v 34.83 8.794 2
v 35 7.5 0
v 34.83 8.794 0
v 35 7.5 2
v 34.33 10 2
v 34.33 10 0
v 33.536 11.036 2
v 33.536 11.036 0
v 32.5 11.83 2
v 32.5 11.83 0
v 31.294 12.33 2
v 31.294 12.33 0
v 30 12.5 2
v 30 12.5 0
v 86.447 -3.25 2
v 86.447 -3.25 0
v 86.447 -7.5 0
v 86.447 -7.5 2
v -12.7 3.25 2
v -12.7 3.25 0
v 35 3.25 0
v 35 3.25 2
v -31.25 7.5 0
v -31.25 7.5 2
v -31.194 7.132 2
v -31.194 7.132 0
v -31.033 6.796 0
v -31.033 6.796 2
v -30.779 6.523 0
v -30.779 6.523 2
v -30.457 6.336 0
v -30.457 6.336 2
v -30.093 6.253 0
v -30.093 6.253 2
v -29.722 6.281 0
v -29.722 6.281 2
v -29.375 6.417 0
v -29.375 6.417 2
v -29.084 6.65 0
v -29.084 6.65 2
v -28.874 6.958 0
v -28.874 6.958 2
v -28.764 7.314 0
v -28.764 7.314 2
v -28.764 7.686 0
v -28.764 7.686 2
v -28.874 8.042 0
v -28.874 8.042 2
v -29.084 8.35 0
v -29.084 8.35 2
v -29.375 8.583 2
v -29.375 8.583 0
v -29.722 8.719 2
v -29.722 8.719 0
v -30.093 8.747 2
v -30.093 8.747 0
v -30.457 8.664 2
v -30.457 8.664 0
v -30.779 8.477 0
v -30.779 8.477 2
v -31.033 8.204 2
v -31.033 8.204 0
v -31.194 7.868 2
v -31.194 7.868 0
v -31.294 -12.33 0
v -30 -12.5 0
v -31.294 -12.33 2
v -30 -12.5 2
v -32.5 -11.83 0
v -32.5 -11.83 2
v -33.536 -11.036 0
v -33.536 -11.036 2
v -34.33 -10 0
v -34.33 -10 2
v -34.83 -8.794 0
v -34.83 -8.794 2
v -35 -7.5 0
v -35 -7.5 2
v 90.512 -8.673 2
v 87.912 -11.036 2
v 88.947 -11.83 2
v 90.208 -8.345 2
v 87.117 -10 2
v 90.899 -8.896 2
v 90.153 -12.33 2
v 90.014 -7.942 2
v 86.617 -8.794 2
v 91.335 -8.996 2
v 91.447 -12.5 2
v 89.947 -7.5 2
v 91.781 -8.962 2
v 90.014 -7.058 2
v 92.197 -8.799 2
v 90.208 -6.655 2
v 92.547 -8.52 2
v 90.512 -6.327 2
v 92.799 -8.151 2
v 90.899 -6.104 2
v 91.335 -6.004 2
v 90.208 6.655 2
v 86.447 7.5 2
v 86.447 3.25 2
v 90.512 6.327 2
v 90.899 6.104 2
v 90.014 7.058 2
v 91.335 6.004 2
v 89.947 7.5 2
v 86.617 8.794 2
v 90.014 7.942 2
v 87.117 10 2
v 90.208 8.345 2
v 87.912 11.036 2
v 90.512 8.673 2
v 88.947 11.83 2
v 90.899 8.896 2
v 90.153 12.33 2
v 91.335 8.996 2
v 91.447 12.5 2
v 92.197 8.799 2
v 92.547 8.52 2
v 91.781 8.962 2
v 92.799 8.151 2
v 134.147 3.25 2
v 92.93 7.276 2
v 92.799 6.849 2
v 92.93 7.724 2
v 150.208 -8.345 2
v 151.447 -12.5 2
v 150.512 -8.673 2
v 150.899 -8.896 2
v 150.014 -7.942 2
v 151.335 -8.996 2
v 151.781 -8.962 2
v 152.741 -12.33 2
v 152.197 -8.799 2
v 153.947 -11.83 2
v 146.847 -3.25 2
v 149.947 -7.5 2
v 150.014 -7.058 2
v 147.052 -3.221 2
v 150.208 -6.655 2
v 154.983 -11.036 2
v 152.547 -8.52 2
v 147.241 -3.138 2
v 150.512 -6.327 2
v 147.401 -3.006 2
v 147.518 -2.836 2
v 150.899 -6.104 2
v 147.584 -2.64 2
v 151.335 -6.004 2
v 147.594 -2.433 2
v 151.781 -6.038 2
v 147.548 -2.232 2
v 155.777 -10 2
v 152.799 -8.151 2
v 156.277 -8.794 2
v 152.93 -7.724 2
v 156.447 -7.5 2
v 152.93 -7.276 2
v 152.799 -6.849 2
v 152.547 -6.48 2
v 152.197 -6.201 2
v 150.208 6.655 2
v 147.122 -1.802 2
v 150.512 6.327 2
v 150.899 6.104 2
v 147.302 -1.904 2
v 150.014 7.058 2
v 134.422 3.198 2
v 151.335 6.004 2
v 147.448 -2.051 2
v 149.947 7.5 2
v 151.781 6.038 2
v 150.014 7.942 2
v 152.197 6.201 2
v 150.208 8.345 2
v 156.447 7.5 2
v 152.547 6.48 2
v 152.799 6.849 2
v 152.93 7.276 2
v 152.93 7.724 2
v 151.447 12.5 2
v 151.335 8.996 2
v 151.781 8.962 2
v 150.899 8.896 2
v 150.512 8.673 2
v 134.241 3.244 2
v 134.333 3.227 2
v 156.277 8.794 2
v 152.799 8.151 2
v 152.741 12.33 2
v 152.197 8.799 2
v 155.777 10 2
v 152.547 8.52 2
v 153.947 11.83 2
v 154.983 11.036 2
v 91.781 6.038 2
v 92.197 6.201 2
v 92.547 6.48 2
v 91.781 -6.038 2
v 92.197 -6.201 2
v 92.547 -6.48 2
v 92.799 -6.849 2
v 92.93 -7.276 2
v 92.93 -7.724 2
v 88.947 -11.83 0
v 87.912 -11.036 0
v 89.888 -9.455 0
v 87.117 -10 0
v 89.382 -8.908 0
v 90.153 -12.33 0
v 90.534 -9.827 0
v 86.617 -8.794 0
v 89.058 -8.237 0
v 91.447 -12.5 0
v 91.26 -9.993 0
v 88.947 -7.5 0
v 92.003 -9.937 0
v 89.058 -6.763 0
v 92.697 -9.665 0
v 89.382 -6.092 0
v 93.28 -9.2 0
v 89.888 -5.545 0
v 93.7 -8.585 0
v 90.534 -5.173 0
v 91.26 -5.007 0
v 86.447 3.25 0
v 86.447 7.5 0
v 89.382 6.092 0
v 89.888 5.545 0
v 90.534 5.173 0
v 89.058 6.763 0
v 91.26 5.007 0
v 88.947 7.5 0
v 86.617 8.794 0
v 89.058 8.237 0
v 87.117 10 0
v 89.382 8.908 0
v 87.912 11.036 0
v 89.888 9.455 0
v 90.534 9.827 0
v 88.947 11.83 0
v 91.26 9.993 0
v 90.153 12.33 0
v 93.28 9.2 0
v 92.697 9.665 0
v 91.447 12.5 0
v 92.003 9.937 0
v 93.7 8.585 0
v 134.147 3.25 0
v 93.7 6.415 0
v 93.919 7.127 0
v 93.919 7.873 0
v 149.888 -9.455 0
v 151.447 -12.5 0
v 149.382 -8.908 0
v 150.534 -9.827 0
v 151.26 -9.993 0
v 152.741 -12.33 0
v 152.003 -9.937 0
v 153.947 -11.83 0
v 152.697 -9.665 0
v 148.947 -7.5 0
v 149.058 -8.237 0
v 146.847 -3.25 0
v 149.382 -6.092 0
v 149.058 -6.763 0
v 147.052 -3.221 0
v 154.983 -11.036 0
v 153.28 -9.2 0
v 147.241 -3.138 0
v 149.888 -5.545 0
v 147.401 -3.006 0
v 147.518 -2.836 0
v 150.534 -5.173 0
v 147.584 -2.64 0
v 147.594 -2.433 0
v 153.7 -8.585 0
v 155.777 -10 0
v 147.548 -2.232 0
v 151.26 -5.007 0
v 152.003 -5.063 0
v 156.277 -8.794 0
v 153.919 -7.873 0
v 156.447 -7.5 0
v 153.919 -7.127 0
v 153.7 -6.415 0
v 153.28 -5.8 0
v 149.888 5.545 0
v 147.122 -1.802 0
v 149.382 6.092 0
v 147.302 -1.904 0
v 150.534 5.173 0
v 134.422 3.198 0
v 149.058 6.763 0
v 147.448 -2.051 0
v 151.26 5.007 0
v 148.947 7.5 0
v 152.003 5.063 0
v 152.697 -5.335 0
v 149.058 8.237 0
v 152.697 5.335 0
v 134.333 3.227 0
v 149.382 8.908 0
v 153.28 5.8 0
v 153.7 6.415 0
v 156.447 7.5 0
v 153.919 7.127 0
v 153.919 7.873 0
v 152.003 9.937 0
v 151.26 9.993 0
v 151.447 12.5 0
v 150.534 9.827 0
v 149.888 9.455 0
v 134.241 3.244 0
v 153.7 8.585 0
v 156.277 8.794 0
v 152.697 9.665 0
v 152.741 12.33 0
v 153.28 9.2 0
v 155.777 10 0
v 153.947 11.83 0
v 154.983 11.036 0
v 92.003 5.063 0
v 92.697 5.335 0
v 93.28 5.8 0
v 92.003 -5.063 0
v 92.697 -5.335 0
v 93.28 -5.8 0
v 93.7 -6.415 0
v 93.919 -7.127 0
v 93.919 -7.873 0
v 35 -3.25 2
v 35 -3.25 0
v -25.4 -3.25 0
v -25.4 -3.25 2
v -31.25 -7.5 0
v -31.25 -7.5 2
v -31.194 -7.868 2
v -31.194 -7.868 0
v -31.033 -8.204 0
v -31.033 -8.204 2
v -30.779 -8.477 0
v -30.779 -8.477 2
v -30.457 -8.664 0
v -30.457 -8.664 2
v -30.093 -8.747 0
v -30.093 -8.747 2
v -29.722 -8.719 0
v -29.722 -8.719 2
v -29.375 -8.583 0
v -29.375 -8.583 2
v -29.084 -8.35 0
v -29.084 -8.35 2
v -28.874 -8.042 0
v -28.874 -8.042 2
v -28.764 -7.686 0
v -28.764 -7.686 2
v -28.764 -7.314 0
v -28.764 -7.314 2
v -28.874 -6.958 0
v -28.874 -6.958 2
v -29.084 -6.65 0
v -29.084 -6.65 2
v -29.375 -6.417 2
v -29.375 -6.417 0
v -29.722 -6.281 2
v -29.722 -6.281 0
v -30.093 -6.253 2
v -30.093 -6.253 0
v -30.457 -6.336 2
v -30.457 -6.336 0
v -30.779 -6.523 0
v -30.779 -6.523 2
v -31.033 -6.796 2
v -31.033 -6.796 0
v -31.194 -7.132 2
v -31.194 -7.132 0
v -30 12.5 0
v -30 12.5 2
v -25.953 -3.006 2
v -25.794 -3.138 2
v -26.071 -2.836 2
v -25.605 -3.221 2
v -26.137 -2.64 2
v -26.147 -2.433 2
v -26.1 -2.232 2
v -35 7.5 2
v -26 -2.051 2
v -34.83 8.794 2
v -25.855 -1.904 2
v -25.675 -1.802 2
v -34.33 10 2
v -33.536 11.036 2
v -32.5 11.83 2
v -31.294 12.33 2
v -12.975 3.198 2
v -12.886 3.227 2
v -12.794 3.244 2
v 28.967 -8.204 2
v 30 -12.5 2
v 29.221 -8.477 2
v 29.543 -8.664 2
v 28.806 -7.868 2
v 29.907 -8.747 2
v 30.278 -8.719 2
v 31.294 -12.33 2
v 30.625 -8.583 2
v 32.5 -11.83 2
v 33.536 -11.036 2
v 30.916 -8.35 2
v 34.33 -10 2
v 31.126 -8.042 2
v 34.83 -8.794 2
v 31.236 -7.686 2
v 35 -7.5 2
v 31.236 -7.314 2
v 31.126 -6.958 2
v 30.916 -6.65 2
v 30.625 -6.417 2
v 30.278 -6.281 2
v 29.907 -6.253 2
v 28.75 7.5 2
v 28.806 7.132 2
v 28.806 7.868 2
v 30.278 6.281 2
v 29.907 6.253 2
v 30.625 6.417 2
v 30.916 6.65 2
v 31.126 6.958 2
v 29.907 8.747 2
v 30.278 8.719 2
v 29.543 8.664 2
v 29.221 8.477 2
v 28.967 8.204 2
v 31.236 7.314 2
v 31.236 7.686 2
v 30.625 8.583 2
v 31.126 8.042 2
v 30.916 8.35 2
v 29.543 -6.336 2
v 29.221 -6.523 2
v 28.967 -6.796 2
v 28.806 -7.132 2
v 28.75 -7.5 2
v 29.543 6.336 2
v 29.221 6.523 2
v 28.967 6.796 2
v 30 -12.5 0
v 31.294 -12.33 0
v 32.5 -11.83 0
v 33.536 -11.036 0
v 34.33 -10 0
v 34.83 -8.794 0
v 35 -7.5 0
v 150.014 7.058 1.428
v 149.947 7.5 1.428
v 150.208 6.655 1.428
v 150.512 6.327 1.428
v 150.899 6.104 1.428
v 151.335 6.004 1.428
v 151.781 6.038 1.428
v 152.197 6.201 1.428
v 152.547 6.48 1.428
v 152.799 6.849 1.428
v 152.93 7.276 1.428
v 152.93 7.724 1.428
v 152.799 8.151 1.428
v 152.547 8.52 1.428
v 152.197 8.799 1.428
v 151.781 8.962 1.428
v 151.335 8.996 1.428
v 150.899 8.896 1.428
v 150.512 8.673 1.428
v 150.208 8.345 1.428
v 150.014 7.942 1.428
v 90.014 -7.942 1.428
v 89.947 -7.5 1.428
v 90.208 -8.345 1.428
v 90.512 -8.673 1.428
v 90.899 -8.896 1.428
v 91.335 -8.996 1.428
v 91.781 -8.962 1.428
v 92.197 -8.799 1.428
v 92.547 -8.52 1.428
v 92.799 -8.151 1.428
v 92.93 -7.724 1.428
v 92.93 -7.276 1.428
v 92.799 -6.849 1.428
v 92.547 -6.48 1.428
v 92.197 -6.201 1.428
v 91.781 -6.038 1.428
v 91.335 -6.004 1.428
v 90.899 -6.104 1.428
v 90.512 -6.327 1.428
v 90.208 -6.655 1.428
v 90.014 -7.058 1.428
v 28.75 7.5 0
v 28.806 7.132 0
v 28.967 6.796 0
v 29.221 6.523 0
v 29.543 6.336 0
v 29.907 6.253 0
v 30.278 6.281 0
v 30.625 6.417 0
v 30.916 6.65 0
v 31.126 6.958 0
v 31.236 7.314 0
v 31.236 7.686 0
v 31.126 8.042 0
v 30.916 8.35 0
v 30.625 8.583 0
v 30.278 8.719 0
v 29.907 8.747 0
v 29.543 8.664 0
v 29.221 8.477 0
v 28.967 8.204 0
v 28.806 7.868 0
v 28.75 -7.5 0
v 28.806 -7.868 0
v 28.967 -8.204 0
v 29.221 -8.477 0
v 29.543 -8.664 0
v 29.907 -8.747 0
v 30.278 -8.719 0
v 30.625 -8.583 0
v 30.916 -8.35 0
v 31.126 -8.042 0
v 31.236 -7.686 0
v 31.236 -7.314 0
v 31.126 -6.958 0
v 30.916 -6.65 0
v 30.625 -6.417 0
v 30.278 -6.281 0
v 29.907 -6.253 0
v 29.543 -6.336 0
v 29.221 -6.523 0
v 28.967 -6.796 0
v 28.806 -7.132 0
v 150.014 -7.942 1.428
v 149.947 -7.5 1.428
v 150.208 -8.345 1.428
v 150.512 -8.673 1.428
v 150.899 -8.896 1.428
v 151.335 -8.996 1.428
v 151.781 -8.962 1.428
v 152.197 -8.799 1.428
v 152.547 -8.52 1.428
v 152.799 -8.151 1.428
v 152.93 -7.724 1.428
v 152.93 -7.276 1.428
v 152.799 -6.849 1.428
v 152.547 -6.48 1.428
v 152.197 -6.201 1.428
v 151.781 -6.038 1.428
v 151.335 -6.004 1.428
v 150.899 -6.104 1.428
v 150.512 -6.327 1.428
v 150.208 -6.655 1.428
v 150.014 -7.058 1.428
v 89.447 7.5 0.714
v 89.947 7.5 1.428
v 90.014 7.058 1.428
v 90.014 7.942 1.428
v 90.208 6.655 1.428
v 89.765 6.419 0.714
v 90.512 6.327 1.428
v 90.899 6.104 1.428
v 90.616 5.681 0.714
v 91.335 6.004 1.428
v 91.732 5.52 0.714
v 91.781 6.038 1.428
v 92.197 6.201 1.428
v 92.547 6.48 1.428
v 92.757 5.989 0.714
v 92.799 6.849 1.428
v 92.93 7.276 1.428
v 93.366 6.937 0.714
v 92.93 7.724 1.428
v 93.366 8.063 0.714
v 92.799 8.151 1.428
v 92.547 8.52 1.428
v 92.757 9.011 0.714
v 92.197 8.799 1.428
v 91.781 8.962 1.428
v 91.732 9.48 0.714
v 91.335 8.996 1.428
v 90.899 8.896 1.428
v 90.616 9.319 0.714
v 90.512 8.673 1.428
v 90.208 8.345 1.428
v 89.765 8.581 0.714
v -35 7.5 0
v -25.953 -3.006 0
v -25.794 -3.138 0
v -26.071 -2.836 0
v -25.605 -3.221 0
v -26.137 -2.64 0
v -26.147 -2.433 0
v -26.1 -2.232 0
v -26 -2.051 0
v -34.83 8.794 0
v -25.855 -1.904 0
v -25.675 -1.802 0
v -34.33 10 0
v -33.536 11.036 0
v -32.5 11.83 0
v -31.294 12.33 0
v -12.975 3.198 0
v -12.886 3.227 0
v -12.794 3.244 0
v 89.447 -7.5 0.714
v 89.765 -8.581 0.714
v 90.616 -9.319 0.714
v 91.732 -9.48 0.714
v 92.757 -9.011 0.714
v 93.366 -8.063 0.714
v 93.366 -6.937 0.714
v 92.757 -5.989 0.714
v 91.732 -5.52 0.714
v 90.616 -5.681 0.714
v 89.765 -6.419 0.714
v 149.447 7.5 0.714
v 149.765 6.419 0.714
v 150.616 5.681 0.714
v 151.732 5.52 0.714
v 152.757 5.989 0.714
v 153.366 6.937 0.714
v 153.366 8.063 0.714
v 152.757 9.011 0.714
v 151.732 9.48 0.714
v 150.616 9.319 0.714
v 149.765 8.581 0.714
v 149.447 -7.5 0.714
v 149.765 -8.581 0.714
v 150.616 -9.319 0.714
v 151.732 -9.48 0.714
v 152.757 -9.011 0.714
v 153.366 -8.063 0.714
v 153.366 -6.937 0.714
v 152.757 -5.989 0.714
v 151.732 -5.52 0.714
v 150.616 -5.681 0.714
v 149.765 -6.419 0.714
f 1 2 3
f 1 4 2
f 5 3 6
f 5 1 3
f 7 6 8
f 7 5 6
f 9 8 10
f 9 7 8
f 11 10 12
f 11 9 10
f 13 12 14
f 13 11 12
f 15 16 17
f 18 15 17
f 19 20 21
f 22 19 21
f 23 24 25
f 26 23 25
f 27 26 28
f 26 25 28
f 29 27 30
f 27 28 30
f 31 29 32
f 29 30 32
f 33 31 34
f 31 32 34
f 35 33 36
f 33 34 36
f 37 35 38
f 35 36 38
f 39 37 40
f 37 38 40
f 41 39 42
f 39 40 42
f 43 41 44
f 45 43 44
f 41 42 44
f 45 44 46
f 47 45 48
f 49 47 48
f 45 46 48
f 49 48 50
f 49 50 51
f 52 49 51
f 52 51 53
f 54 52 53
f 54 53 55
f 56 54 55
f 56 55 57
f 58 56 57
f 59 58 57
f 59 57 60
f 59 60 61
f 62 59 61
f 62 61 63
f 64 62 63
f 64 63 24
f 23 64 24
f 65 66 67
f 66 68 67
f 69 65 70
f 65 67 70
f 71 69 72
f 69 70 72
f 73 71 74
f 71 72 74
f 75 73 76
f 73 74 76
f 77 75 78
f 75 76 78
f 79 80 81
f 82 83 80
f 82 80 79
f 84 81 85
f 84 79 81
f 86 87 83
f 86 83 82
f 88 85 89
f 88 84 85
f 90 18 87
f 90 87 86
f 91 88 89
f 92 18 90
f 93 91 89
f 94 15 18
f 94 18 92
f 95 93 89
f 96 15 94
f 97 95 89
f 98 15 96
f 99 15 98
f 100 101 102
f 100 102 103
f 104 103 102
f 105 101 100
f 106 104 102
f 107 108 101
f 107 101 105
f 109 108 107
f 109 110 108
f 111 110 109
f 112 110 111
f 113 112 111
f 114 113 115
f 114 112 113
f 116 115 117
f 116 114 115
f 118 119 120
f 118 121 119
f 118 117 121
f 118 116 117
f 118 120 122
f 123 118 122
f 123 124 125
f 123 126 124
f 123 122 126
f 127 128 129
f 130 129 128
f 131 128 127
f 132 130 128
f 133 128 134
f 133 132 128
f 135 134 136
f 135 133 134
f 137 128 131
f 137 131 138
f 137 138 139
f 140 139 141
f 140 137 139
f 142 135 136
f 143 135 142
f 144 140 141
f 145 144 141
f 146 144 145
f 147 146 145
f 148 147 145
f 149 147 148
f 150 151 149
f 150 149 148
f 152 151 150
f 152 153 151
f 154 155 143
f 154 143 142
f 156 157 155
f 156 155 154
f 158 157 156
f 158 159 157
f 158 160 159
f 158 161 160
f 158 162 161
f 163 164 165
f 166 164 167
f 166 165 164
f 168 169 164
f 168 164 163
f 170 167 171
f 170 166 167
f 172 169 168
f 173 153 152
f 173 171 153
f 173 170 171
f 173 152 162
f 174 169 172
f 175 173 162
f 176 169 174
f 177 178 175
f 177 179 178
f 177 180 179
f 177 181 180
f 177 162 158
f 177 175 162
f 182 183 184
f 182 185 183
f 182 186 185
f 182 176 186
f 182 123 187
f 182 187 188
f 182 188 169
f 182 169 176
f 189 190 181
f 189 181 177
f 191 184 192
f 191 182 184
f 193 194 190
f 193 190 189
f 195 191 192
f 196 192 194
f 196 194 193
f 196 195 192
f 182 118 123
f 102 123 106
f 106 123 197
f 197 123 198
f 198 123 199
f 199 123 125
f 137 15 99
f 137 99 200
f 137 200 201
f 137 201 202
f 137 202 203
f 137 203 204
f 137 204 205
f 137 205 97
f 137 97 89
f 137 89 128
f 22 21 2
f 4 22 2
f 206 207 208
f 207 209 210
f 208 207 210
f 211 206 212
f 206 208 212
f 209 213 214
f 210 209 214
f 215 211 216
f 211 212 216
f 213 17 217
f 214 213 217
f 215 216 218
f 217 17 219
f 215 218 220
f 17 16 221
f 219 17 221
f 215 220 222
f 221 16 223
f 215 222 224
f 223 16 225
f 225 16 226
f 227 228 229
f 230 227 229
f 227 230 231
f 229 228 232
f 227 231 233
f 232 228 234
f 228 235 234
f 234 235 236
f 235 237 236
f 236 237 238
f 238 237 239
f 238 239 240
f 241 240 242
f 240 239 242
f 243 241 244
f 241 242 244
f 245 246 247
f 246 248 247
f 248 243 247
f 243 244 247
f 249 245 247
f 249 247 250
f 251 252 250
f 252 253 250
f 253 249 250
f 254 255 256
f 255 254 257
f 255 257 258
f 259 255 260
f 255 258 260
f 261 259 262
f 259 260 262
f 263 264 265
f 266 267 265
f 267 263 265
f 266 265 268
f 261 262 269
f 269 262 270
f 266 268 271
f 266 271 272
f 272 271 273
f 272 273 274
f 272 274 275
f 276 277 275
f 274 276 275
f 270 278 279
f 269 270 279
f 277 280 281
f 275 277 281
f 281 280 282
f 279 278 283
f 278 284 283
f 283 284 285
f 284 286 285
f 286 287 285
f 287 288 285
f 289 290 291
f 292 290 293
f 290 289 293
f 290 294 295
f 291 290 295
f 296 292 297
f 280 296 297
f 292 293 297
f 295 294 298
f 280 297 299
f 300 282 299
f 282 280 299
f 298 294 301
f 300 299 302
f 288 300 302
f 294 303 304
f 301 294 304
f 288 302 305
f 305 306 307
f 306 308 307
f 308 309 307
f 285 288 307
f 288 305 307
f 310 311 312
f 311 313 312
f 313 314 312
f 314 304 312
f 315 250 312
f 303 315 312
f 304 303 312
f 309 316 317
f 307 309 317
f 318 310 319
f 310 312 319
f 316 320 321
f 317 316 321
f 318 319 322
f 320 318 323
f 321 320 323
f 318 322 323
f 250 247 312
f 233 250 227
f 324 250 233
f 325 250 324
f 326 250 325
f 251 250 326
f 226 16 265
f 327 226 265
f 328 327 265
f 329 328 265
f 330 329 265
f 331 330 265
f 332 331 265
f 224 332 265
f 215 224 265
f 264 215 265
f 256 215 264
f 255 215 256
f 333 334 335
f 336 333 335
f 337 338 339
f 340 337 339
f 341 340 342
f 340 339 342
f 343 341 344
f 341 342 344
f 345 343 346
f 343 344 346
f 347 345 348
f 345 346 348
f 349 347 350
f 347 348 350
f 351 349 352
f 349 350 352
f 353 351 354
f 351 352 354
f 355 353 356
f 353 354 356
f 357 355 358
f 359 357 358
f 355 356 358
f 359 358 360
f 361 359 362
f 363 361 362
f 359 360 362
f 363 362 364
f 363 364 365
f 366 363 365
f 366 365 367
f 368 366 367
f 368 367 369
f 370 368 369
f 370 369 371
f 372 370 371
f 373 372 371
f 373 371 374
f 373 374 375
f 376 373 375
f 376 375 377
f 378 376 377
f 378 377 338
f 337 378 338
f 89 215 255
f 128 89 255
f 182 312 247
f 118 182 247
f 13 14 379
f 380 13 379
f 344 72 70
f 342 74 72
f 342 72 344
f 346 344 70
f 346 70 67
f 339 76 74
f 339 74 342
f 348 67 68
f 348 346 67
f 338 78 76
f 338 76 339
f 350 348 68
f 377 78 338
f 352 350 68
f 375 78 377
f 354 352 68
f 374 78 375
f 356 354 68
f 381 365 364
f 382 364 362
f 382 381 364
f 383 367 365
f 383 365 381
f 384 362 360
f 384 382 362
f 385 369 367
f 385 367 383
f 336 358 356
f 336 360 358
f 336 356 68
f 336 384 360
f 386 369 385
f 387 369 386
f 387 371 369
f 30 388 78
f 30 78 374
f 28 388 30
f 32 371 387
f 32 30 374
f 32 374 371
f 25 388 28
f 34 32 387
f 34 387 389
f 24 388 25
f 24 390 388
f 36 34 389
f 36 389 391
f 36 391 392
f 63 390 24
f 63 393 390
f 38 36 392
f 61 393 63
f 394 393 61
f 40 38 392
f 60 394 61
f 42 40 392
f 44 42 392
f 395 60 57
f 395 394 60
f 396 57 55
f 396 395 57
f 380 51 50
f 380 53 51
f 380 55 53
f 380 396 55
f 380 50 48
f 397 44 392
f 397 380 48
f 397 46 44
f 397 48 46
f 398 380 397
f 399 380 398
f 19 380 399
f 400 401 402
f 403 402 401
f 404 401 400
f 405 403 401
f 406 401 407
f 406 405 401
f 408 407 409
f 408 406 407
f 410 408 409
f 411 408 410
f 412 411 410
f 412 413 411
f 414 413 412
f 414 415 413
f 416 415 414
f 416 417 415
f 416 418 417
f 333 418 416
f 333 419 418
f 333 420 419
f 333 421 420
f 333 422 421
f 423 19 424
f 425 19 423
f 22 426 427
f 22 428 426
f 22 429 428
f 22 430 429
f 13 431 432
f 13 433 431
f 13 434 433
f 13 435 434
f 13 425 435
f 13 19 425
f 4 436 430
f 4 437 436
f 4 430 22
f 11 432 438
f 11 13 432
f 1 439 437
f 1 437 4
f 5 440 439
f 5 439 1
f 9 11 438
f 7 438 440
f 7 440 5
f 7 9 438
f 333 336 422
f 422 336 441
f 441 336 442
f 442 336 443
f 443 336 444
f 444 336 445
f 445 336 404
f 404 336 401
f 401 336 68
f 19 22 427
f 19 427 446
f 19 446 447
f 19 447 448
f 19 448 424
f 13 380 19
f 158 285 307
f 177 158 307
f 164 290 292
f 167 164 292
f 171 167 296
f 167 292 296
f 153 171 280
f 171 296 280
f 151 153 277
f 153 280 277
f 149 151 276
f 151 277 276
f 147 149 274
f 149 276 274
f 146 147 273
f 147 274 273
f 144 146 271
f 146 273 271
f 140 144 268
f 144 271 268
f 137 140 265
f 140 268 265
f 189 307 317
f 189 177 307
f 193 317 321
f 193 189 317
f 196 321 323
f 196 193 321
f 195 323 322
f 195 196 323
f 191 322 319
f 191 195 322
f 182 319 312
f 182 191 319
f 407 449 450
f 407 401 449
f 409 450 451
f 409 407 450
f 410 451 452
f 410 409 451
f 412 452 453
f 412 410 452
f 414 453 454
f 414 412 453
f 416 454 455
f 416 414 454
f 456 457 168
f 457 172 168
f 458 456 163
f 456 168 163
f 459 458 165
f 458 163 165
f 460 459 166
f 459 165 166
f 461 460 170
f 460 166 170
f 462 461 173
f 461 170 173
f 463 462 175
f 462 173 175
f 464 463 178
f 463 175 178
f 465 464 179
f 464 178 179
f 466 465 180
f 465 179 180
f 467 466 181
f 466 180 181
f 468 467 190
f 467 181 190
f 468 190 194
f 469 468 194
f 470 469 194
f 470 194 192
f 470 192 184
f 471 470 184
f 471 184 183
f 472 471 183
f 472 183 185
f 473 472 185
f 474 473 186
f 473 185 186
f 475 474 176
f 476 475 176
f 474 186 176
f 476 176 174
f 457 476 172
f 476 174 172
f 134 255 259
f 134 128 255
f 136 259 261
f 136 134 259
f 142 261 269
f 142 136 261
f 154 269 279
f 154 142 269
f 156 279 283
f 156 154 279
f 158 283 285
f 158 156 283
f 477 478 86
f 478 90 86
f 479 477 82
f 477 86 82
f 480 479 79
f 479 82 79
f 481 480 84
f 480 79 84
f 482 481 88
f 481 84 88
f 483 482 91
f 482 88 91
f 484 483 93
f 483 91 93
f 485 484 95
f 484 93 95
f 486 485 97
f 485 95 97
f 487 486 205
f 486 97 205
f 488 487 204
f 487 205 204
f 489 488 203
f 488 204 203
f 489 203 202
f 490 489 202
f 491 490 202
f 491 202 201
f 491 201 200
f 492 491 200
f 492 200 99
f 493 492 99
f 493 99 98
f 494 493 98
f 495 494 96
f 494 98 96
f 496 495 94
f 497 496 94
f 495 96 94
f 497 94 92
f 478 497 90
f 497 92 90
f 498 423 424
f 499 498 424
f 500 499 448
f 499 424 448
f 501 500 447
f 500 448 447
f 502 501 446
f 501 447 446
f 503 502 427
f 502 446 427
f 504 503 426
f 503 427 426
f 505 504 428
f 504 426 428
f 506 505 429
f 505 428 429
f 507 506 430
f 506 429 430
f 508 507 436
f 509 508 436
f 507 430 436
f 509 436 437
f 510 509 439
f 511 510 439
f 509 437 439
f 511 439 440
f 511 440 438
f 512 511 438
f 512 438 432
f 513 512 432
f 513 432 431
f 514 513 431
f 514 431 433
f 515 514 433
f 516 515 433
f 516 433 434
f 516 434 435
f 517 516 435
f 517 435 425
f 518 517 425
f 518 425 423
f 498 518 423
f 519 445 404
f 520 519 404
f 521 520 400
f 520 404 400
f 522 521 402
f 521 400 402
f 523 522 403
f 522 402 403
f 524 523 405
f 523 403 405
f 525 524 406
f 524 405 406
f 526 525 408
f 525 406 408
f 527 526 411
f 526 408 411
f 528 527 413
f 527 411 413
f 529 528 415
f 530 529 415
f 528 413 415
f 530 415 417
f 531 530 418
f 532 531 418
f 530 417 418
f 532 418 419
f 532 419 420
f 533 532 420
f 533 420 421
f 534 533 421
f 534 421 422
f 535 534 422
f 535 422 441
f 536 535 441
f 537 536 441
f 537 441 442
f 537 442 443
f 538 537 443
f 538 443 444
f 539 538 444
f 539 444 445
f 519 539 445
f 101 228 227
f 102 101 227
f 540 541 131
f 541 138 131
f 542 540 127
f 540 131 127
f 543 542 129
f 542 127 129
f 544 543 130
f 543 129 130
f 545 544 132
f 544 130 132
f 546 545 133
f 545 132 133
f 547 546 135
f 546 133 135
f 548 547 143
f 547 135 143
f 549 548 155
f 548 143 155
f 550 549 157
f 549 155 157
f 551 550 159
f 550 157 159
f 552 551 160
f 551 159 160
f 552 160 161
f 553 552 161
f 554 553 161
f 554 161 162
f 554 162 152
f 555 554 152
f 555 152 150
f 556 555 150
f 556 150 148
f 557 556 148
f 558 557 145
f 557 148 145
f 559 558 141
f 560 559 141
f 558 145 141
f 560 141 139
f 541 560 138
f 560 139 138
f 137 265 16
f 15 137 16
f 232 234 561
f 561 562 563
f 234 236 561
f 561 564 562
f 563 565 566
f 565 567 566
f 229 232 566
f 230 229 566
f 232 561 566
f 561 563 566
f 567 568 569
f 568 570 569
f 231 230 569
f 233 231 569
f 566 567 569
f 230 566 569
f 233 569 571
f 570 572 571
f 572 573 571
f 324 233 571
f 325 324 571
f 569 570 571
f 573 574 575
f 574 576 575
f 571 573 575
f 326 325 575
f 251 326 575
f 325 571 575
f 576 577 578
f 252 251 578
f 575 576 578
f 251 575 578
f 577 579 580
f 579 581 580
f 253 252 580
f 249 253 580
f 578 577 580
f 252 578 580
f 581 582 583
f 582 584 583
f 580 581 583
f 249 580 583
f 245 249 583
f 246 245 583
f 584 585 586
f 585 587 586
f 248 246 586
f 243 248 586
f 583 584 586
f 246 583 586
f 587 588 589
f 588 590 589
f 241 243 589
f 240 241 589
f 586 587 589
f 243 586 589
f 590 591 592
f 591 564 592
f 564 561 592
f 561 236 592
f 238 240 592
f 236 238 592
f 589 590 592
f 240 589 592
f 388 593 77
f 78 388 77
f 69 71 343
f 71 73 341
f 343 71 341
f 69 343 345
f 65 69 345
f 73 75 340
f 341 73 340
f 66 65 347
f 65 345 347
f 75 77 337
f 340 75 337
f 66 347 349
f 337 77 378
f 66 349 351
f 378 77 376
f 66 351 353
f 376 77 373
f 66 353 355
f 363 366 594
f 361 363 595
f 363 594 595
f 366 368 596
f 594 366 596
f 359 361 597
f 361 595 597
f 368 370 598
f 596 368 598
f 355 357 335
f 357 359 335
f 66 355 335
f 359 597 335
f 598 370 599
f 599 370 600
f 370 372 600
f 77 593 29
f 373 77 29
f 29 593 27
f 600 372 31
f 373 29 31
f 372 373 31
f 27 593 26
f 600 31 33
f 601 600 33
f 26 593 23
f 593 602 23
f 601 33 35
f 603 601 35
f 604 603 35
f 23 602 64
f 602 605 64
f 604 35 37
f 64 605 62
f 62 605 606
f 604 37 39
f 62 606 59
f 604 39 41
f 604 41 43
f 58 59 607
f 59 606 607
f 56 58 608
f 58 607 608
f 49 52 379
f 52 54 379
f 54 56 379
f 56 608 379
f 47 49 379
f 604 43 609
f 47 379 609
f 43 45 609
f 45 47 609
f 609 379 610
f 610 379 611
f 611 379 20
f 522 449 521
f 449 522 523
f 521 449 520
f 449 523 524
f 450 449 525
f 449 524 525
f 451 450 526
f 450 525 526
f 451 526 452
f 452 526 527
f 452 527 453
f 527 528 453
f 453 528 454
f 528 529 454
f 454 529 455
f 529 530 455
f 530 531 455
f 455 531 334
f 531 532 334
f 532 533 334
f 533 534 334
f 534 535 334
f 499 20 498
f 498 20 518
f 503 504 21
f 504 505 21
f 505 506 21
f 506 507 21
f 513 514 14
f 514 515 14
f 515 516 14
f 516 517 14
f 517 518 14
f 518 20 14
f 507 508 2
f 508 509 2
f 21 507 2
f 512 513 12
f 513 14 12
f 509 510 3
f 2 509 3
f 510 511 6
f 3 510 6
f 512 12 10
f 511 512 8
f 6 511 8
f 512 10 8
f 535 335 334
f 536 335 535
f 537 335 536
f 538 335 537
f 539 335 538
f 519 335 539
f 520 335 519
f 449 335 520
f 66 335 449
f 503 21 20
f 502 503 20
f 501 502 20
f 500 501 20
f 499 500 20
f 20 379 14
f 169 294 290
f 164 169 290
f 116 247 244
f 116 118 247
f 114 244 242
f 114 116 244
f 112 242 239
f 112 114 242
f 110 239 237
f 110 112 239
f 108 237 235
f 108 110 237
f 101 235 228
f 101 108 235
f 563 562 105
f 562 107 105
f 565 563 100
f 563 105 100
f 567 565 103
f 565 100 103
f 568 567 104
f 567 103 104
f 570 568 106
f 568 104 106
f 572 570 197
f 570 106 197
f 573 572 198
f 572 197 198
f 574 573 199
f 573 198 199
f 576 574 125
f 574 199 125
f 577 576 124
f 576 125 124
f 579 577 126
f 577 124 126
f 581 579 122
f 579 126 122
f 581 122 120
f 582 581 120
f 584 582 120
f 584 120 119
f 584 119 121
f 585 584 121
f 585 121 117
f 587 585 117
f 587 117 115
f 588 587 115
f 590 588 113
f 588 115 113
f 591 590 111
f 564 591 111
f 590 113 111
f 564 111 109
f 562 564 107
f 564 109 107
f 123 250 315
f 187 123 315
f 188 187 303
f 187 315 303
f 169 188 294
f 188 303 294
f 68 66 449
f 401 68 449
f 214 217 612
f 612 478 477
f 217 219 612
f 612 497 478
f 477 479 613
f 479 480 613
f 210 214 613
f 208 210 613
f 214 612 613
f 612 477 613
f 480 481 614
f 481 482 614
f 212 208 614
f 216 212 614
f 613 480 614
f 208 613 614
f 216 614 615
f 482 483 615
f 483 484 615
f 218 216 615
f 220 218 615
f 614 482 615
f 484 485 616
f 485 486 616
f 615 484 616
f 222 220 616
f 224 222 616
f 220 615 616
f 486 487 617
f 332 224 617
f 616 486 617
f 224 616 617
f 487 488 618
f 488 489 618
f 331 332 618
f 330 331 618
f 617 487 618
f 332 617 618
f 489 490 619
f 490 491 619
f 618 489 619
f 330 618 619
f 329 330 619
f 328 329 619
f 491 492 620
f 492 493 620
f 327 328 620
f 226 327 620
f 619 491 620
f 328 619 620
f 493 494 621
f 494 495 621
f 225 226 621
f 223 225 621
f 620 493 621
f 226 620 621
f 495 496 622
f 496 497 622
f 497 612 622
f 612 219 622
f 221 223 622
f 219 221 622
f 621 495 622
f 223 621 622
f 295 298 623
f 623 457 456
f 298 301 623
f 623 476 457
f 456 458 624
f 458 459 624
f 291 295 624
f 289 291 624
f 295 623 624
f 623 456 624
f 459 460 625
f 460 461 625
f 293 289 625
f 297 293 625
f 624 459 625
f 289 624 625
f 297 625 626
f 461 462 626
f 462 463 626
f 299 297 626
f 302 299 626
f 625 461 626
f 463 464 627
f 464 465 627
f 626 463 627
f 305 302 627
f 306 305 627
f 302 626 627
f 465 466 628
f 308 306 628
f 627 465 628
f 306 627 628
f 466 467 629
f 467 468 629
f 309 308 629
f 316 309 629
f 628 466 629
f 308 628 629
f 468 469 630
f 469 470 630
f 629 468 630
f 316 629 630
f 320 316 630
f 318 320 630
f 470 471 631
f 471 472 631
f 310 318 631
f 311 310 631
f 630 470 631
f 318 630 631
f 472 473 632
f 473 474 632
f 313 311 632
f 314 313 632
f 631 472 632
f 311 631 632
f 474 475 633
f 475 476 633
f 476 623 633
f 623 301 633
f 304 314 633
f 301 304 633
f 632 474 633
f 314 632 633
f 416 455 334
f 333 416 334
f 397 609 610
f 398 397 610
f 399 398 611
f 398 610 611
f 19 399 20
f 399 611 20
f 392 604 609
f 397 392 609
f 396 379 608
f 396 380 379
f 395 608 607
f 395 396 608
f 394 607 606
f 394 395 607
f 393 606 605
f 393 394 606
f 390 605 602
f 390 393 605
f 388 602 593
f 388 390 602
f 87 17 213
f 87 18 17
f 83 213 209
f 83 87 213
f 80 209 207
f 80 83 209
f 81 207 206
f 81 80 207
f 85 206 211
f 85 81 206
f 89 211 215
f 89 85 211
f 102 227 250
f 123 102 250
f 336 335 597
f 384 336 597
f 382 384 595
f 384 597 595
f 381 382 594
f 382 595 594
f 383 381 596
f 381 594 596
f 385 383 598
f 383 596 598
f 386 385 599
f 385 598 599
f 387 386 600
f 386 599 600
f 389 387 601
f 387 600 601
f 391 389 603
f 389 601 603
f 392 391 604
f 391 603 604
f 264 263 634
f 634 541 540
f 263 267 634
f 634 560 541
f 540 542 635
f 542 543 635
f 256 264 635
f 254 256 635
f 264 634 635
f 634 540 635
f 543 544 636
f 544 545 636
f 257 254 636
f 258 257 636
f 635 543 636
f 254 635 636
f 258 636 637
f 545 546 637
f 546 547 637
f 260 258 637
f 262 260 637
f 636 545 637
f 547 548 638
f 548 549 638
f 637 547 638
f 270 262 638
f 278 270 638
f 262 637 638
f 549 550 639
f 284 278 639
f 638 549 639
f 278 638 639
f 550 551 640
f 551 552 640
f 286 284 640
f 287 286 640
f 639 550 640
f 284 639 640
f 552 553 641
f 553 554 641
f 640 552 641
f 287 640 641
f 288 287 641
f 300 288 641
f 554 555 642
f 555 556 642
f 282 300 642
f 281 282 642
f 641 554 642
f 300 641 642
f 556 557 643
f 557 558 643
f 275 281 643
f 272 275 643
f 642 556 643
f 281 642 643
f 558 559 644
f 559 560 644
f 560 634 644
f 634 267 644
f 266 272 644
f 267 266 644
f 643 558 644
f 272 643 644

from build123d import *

# Parameters (mm, degrees)
F1_DEPTH       = 2
F2_R           = 5
F3_D           = 2.5
F4_D           = 3
F4_CSINK_D     = 5
F4_CSINK_ANGLE = 70


with BuildPart() as f1:
    # F0 (on Top) → F1 (new body)
    with BuildSketch(Plane.XY):
        with BuildLine():
            Line((-35, -7.5), (-35, -12.5))
            Line((-35, -12.5), (30, -12.5))
            Line((30, -12.5), (35, -12.5))
            Line((35, -12.5), (35, -3.25))
            Line((35, -3.25), (25.4, -3.25))
            Line((25.4, -3.25), (-25.4, -3.25))
            ThreePointArc((-25.4, -3.25), (-26.13685, -2.639826), (-25.674749, -1.802137))
            Line((-25.674749, -1.802137), (-12.974749, 3.197863))
            ThreePointArc((-12.974749, 3.197863), (-12.839826, 3.23685), (-12.7, 3.25))
            Line((-12.7, 3.25), (12.7, 3.25))
            Line((12.7, 3.25), (35, 3.25))
            Line((35, 3.25), (35, 12.5))
            Line((35, 12.5), (-30, 12.5))
            Line((-30, 12.5), (-35, 12.5))
            Line((-35, 12.5), (-35, 7.5))
            Line((-35, 7.5), (-35, -7.5))
        make_face()
        with BuildLine():
            Line((86.447124, 3.25), (108.747124, 3.25))
            Line((108.747124, 3.25), (134.147124, 3.25))
            ThreePointArc((134.147124, 3.25), (134.28695, 3.23685), (134.421873, 3.197863))
            Line((134.421873, 3.197863), (147.121873, -1.802137))
            ThreePointArc((147.121873, -1.802137), (147.583974, -2.639826), (146.847124, -3.25))
            Line((146.847124, -3.25), (96.047124, -3.25))
            Line((96.047124, -3.25), (86.447124, -3.25))
            Line((86.447124, -3.25), (86.447124, -12.5))
            Line((86.447124, -12.5), (91.447124, -12.5))
            Line((91.447124, -12.5), (156.447124, -12.5))
            Line((156.447124, -12.5), (156.447124, -7.5))
            Line((156.447124, -7.5), (156.447124, 7.5))
            Line((156.447124, 7.5), (156.447124, 12.5))
            Line((156.447124, 12.5), (151.447124, 12.5))
            Line((151.447124, 12.5), (86.447124, 12.5))
            Line((86.447124, 12.5), (86.447124, 3.25))
        make_face()
    extrude(amount=F1_DEPTH)

    # F2
    f2_edges = [f1.edges().sort_by_distance(p)[0] for p in [
        (-35, 12.5, 1),
        (35, 12.5, 1),
        (-35, -12.5, 1),
        (35, -12.5, 1),
        (86.447124, 12.5, 1),
        (156.447124, 12.5, 1),
        (86.447124, -12.5, 1),
        (156.447124, -12.5, 1),
    ]]
    fillet(f2_edges, radius=F2_R)

    # F3 (through all)
    with Locations(Plane(origin=(0, 0, 0), x_dir=(1, 0, 0), z_dir=(0, 0, -1))):
        with Locations((-30, 7.5), (-30, -7.5), (30, -7.5), (30, 7.5)):
            Hole(F3_D / 2)

    # F4 (through all)
    with Locations(Plane(origin=(0, 0, 0), x_dir=(1, 0, 0), z_dir=(0, 0, -1))):
        with Locations((91.447124, 7.5), (151.447124, 7.5), (151.447124, -7.5), (91.447124, -7.5)):
            CounterSinkHole(F4_D / 2, F4_CSINK_D / 2, counter_sink_angle=F4_CSINK_ANGLE)


solid = f1.part
